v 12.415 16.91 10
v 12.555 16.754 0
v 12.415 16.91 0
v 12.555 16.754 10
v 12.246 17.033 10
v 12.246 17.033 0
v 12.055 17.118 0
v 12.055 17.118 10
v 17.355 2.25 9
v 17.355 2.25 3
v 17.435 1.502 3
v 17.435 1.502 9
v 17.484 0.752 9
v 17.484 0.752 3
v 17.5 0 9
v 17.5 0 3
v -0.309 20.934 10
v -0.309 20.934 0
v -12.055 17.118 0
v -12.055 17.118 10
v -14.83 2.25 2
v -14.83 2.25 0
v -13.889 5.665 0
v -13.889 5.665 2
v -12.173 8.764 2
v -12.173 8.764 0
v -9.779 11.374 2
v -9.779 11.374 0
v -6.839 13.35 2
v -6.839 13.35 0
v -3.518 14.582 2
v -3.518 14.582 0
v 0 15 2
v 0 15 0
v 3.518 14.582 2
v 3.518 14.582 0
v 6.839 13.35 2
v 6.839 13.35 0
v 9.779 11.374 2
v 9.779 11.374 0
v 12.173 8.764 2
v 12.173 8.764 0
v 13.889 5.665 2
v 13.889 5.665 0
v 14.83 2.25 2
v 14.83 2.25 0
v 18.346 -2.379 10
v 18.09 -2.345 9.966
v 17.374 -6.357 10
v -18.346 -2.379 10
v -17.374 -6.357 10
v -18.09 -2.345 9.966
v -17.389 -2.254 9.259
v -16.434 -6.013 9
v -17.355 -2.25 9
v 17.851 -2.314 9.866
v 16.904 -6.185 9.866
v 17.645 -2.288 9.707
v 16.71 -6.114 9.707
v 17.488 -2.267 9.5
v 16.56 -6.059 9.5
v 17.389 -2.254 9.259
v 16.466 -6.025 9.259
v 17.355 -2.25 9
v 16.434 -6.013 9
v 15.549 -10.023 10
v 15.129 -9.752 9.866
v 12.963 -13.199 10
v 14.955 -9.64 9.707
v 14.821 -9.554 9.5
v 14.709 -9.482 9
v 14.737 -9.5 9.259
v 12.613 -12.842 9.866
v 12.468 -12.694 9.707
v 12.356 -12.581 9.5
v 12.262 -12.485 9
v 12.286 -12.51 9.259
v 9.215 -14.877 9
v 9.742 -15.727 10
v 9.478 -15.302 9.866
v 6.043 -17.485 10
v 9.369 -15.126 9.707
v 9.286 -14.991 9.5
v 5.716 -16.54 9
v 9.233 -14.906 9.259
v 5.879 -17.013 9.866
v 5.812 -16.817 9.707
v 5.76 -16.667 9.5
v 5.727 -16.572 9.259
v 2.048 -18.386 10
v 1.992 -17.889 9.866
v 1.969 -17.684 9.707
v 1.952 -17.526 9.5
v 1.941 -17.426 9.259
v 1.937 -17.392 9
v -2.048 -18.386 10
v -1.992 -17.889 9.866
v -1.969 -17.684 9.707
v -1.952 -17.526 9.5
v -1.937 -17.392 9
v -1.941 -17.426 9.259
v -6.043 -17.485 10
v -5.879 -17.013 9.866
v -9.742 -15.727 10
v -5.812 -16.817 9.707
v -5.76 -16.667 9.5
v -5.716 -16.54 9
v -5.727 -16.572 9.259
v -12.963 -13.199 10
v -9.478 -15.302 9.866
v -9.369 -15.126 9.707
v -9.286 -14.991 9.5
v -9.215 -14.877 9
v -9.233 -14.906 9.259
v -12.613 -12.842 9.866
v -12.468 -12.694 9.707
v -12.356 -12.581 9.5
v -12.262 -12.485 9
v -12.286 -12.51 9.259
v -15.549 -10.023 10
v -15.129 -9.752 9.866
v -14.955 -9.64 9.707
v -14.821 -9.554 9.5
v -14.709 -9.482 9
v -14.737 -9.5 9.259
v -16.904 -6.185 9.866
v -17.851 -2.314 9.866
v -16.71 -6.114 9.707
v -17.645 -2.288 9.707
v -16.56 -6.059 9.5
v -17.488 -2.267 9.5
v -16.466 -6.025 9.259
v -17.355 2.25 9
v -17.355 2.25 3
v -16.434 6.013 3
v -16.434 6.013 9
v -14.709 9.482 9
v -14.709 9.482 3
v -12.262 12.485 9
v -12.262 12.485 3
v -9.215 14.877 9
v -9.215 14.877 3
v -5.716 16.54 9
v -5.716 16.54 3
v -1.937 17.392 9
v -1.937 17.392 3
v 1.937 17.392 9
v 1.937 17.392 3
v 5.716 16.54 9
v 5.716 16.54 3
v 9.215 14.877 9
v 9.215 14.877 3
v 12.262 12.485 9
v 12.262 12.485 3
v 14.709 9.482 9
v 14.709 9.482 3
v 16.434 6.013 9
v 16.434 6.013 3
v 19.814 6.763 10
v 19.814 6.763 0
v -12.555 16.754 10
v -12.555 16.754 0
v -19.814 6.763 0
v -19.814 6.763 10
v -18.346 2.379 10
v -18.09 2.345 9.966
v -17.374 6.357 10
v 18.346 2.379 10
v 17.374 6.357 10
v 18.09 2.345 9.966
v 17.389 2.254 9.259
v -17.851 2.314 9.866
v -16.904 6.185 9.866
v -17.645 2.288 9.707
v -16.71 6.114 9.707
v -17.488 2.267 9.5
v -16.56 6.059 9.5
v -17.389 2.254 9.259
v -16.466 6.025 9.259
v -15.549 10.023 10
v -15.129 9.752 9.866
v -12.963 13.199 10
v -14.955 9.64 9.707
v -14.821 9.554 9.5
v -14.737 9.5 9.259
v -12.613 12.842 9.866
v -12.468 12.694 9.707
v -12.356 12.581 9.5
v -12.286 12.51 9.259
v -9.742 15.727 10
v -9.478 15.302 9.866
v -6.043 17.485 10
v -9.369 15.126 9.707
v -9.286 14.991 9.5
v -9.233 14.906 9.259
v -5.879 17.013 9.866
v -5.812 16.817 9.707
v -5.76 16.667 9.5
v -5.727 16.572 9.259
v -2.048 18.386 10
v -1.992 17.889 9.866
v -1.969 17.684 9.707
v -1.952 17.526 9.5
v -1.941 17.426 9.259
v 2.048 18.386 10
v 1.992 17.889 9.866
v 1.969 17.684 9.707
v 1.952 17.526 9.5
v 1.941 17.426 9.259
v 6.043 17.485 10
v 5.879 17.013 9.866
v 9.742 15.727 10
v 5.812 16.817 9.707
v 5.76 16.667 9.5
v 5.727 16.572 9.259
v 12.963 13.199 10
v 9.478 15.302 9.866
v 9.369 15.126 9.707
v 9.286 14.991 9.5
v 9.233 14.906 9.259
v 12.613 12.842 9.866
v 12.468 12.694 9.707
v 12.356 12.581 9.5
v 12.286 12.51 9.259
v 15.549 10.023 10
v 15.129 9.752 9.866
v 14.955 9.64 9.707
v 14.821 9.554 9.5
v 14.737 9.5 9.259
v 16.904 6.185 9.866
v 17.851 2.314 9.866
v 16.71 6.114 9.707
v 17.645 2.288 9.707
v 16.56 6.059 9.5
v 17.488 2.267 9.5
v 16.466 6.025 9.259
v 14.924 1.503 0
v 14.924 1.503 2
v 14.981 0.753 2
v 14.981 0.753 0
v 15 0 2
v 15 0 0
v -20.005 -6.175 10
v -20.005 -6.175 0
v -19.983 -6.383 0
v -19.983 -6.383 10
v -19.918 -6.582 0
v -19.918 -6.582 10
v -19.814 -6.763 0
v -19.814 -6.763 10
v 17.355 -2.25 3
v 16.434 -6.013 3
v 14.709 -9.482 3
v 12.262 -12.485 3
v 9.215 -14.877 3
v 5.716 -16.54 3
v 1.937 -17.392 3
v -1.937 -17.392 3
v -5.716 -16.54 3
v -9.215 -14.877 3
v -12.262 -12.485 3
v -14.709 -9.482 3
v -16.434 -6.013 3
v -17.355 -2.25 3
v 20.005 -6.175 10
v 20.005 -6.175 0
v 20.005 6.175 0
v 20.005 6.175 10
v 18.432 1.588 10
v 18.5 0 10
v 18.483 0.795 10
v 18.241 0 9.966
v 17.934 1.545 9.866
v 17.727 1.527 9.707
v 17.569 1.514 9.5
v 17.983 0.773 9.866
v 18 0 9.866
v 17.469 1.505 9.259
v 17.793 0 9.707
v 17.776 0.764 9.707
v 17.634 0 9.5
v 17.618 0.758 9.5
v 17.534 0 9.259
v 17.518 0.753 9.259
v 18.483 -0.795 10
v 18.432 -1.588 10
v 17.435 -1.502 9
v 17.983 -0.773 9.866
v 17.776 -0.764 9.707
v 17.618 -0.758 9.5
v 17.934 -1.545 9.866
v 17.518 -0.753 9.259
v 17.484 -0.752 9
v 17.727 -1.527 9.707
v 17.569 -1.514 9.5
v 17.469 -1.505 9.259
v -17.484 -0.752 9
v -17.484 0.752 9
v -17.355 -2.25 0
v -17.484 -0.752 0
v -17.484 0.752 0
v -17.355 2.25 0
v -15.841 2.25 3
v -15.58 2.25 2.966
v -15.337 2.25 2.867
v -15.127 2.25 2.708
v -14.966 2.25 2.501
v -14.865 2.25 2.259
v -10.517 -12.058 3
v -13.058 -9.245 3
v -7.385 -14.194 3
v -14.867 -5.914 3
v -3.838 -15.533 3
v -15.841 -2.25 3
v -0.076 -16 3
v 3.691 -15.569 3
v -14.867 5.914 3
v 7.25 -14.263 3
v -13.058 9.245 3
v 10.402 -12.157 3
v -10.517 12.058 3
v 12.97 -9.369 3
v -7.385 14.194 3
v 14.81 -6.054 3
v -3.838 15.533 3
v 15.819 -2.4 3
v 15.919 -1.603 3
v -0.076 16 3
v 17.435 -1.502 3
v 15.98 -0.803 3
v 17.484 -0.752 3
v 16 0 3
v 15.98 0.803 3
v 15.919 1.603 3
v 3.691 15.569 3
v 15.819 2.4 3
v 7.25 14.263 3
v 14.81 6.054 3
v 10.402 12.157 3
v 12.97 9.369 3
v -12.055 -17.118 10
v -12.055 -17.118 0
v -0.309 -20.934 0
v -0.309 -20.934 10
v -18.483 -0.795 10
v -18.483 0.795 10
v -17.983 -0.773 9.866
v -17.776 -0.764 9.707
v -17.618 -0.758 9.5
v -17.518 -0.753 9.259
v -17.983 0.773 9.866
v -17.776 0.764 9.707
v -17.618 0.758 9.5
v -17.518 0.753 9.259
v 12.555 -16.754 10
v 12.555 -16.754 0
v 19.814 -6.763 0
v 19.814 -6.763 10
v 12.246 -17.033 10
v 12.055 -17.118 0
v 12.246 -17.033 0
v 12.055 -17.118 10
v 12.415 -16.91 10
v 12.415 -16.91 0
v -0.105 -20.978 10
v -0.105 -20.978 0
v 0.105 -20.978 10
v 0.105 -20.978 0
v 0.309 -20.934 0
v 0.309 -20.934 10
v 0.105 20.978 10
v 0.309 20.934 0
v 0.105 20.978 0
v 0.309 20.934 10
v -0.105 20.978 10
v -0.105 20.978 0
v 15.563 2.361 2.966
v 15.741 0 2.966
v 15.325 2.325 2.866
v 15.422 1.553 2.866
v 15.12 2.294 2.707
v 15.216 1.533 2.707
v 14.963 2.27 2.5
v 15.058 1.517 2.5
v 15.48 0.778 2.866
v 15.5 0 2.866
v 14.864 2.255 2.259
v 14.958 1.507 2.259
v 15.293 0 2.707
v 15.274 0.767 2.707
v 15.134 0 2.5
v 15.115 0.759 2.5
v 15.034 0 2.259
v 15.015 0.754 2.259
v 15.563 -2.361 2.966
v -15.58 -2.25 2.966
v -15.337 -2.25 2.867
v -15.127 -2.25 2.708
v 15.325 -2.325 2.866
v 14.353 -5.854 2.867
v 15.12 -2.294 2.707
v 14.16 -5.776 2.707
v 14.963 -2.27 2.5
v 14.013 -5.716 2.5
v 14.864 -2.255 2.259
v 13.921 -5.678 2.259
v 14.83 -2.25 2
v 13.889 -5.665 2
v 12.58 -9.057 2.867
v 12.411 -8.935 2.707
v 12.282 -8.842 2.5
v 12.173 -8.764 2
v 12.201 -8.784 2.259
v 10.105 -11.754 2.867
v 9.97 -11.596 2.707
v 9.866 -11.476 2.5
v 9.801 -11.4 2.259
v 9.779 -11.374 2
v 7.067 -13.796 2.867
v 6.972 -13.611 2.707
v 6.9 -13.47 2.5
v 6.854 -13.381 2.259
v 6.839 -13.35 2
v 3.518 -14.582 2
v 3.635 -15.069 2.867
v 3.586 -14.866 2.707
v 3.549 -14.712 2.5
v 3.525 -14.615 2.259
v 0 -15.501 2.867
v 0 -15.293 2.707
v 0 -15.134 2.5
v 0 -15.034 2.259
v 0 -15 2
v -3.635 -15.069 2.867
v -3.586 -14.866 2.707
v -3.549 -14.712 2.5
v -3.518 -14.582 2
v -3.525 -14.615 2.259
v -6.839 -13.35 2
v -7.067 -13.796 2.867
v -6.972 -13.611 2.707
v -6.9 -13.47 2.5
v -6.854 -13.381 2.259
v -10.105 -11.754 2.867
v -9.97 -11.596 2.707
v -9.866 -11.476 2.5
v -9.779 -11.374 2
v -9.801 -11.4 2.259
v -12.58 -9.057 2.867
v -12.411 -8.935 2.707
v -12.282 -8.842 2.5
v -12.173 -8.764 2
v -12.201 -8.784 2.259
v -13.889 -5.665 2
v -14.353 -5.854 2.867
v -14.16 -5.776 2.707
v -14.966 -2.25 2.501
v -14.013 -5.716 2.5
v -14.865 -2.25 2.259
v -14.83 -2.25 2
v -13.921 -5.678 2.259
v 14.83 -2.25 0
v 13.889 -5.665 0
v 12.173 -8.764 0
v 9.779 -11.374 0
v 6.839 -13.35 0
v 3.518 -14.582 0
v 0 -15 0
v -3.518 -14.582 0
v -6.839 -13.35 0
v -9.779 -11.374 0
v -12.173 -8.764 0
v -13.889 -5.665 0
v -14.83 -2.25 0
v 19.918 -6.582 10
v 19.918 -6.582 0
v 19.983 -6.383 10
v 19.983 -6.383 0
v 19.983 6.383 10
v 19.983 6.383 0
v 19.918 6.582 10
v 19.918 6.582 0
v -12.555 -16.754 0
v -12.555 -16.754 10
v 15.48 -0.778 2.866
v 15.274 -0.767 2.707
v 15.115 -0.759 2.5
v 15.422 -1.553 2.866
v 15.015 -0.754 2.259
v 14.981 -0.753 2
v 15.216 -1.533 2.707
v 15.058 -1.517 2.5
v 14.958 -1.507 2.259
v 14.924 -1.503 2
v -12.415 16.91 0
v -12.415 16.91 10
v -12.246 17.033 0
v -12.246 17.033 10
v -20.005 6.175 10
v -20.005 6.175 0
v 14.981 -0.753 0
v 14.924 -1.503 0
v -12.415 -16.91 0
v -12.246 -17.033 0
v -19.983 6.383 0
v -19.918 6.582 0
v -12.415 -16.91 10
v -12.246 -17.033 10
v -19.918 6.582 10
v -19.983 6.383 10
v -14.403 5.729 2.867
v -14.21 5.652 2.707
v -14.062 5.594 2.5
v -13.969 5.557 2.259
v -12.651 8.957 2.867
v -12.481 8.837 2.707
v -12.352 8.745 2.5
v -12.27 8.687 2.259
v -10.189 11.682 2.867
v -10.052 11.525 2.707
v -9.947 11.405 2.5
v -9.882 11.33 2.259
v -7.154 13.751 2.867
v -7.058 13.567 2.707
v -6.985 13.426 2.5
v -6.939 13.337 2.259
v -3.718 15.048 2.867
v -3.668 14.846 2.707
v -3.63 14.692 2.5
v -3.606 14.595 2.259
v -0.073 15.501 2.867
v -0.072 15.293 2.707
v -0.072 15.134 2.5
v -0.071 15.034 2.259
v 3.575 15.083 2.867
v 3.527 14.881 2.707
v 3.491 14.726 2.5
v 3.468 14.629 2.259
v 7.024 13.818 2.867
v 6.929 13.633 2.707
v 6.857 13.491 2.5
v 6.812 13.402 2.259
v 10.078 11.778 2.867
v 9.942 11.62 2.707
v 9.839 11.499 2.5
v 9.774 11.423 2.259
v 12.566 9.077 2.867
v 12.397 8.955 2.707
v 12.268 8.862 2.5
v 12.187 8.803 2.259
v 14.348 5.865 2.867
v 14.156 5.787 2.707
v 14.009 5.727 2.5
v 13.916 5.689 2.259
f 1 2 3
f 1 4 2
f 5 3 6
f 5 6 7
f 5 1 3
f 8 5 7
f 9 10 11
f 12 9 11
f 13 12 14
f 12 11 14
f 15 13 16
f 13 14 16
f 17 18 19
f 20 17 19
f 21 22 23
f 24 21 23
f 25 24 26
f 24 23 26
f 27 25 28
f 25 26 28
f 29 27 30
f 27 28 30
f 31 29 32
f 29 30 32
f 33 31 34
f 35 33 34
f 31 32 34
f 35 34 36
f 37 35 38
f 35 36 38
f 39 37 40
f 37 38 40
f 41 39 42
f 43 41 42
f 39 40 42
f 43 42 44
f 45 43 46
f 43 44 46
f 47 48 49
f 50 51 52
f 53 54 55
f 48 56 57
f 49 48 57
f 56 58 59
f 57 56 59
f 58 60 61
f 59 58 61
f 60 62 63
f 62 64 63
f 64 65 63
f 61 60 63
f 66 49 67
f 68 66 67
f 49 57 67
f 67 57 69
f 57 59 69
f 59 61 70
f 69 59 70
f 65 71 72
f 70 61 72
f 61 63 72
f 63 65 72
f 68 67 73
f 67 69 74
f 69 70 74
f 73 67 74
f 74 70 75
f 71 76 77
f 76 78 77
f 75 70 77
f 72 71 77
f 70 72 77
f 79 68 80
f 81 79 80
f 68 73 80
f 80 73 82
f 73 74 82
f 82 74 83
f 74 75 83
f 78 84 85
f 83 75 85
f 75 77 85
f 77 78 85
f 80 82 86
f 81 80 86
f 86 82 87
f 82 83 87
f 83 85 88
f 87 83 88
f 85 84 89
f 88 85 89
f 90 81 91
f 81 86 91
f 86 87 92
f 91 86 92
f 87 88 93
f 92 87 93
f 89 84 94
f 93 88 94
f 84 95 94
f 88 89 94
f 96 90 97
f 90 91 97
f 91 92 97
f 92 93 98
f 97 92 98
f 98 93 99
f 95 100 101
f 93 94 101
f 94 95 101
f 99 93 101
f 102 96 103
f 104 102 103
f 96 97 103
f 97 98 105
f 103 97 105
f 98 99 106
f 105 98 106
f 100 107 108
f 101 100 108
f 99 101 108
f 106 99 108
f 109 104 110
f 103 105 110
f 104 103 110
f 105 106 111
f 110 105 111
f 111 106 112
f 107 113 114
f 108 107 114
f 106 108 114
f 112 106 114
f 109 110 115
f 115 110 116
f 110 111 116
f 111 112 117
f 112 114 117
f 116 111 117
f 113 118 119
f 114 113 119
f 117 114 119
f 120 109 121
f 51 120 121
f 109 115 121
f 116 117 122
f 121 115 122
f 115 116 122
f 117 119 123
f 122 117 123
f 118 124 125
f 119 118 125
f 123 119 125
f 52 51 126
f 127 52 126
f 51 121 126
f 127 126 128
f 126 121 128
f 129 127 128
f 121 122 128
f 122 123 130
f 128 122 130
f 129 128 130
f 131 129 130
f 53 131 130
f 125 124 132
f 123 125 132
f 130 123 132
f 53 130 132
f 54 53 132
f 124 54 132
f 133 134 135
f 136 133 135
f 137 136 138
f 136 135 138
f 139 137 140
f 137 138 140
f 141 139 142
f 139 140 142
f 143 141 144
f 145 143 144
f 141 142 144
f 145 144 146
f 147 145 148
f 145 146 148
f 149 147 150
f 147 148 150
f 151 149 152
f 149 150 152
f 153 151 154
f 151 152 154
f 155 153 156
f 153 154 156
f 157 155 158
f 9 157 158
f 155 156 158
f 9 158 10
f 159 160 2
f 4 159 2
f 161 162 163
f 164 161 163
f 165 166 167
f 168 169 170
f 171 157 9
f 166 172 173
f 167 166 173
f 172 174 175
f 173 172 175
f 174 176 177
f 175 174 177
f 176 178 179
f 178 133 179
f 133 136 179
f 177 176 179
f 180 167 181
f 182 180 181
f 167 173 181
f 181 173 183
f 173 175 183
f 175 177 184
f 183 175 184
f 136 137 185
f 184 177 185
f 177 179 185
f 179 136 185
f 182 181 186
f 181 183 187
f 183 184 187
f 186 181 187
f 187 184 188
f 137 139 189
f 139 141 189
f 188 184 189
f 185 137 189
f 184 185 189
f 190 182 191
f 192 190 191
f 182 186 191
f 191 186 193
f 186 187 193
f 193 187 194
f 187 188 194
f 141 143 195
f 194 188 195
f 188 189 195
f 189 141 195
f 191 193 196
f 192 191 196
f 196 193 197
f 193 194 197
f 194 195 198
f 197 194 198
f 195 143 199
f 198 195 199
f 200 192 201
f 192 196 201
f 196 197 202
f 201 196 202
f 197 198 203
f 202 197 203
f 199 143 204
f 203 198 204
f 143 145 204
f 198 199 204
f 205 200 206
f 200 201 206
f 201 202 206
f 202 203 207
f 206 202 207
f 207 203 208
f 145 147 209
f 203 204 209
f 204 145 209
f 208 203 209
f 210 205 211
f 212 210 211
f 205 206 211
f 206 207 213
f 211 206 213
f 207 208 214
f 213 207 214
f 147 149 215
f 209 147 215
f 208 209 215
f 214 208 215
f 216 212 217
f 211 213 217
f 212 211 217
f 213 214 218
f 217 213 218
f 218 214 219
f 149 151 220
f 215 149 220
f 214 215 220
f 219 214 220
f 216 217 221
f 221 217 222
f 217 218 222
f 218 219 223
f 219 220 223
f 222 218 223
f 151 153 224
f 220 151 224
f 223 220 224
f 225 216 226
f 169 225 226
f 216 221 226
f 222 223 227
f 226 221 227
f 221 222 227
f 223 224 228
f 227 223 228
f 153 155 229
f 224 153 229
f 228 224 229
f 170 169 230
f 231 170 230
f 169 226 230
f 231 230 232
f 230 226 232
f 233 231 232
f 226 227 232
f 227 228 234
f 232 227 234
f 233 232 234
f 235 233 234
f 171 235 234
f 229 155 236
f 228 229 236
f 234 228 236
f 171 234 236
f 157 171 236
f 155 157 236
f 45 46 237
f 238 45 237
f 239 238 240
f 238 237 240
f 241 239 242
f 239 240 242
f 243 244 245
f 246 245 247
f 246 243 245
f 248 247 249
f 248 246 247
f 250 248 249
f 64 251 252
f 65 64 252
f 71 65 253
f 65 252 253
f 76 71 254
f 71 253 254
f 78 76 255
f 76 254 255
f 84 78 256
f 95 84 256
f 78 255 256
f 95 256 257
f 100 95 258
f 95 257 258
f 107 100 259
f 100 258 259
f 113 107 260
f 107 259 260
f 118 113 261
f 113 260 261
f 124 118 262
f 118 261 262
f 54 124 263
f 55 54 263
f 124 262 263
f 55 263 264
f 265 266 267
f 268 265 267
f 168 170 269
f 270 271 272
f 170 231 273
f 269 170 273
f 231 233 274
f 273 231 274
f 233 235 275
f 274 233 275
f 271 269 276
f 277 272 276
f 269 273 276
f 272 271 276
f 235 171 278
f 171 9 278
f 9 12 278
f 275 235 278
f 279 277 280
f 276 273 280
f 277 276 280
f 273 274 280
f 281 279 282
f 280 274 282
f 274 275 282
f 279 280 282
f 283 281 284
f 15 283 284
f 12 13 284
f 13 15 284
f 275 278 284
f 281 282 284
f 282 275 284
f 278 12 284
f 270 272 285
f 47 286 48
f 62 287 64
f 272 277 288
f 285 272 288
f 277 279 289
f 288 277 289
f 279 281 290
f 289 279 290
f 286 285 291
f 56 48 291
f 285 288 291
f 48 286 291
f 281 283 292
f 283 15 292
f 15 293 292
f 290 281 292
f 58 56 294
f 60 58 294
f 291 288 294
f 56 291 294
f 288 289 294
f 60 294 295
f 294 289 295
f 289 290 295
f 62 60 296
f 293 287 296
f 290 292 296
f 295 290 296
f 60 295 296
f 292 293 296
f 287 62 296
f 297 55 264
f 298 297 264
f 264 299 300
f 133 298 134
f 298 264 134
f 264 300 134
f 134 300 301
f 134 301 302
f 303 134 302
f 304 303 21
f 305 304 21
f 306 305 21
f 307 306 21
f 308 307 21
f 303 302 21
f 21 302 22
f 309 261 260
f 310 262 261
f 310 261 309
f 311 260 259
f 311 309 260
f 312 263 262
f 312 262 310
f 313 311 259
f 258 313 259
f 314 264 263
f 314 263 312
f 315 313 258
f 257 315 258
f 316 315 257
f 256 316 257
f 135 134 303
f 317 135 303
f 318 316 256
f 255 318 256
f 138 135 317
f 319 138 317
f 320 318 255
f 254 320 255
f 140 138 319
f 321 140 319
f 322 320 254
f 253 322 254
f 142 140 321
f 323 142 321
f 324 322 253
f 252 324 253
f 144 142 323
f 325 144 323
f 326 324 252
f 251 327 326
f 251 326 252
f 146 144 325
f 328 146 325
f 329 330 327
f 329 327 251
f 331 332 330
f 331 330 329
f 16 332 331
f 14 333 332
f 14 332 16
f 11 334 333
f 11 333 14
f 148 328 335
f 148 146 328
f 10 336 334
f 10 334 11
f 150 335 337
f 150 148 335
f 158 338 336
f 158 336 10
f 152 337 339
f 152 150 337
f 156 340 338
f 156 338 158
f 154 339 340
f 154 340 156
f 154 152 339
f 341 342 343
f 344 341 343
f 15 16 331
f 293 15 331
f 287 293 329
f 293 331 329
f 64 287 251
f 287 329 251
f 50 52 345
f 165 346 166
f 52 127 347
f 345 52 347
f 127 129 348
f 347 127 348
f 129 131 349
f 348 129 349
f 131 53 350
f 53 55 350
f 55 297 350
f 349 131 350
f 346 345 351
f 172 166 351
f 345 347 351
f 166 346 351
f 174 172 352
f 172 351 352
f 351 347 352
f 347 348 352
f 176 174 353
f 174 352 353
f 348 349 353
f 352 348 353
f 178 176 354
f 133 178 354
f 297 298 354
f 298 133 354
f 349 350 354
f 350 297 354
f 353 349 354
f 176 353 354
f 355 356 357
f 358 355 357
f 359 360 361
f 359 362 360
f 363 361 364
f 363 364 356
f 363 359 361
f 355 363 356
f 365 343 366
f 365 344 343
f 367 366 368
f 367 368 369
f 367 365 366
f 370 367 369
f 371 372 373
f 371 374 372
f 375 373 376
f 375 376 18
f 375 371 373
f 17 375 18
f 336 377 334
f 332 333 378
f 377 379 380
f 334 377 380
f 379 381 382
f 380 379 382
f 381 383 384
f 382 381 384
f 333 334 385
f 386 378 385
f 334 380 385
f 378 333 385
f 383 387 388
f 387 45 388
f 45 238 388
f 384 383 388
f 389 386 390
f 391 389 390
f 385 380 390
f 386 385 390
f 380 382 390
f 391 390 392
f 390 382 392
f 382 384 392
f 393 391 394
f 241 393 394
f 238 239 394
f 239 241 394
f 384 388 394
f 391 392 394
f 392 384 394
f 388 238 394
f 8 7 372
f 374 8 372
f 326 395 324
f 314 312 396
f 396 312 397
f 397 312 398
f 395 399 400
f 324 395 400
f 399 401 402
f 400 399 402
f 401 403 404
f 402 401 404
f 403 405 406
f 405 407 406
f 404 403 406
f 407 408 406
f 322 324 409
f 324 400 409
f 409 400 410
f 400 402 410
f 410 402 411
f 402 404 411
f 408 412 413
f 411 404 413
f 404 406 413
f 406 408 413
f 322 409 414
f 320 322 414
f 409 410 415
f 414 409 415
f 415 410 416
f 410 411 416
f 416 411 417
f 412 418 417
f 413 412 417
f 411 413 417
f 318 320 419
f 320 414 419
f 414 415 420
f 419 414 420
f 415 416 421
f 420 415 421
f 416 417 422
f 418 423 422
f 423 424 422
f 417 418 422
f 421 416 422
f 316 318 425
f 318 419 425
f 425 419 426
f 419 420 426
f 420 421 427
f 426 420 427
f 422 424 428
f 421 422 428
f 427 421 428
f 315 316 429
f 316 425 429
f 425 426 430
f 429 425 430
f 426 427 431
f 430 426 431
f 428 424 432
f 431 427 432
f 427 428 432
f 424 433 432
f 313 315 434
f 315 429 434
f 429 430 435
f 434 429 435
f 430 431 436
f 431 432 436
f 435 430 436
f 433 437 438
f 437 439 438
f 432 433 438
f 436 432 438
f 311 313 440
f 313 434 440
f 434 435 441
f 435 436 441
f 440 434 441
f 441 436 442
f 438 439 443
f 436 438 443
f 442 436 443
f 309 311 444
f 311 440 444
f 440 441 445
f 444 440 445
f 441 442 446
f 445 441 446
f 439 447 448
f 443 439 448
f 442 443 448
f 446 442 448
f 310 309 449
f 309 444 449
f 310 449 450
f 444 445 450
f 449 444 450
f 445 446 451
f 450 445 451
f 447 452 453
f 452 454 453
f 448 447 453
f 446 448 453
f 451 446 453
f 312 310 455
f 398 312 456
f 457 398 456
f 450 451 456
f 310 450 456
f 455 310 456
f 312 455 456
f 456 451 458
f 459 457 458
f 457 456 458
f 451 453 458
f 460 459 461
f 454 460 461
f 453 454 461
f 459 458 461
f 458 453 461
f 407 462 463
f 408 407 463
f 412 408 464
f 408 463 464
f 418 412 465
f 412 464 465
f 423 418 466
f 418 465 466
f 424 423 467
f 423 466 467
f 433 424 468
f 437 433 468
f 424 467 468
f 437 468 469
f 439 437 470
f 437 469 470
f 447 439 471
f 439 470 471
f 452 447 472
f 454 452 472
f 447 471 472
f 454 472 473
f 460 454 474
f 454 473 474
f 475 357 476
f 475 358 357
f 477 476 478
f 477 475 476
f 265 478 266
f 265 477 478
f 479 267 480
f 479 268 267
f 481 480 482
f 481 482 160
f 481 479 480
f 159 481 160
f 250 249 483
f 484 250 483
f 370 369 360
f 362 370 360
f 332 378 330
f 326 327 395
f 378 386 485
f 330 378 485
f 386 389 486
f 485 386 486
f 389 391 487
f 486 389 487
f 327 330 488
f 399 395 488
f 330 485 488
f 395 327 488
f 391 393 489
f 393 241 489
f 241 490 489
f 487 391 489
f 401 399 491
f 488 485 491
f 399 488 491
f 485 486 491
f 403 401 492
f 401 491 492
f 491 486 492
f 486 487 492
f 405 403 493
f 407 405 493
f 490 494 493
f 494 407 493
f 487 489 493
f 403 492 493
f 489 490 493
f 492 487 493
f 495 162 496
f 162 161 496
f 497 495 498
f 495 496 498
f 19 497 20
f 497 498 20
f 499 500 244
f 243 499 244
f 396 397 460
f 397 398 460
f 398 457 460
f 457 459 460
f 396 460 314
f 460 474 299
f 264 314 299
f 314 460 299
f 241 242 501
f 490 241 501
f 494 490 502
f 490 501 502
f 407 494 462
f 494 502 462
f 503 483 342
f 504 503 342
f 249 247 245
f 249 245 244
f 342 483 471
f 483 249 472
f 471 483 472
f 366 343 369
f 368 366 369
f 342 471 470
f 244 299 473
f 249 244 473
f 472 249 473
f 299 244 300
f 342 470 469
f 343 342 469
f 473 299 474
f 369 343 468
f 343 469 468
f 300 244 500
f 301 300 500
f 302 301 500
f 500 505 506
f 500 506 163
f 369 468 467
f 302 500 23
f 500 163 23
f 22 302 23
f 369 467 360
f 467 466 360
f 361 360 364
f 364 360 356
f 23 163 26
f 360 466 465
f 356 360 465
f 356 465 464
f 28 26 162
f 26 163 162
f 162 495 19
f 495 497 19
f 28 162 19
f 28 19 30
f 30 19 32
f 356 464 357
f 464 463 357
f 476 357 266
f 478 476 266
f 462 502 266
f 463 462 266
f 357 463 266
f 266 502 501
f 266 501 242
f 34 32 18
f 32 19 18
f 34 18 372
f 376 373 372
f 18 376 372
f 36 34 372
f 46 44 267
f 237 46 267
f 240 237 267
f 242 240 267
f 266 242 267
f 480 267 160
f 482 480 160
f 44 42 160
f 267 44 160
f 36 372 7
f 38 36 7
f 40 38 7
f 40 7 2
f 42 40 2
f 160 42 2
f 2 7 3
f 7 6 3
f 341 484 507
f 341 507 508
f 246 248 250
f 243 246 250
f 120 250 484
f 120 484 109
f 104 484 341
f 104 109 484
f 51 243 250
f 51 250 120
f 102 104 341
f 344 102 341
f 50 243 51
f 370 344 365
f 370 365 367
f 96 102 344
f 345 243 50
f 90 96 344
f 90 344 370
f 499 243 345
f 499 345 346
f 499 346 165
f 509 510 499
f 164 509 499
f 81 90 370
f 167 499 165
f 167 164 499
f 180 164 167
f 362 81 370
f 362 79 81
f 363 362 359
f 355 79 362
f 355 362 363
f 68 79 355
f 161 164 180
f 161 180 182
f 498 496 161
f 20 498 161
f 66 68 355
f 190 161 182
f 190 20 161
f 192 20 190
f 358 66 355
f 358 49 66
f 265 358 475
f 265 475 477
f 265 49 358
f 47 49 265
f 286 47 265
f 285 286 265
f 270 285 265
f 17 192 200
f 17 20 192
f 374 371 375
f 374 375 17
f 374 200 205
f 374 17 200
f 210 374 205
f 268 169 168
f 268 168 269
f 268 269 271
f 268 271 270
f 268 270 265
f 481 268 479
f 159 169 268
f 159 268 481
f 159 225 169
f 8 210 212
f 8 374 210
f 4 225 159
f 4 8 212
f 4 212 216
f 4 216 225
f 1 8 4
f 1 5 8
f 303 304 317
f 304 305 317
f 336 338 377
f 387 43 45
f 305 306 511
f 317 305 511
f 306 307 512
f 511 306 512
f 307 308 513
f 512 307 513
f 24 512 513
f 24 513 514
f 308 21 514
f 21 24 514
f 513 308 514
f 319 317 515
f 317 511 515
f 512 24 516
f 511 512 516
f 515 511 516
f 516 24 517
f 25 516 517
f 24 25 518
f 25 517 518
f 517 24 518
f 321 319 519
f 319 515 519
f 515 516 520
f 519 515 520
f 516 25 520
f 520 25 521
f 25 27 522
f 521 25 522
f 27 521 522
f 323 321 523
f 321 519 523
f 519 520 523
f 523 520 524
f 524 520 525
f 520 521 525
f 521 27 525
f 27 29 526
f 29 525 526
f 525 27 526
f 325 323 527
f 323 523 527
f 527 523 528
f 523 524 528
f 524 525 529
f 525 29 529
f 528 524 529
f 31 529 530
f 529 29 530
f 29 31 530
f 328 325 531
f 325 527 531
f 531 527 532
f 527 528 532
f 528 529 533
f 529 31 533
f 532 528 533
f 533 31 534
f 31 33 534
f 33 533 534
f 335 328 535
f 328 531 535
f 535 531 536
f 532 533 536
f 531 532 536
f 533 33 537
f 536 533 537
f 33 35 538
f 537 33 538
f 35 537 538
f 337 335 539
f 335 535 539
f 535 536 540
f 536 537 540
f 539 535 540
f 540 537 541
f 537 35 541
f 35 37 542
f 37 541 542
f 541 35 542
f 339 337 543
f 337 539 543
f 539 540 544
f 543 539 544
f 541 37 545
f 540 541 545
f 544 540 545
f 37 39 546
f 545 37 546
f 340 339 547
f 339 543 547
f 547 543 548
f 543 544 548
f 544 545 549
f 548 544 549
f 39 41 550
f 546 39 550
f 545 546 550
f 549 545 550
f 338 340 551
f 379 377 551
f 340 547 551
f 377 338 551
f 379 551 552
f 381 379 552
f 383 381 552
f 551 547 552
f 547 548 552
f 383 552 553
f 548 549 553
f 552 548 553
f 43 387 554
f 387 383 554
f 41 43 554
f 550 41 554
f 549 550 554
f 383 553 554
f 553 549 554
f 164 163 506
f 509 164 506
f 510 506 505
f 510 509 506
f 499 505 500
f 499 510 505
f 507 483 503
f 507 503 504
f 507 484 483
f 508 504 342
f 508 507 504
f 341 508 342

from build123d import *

# Parameters (mm, degrees)
F1_DEPTH = 10
F2_DEPTH = 3
F3_R     = 1
F4_R     = 1
F5_R     = 1


with BuildPart() as f1:
    # F0 (on Top) → F1 (new body)
    with BuildSketch(Plane.XY):
        with BuildLine():
            ThreePointArc((17.3547543918, 2.25), (17.4636508476, 1.1273415949), (17.5, 0))
            ThreePointArc((17.5, 0), (17.4636508476, -1.1273415949), (17.3547543918, -2.25))
            Line((17.3547543918, -2.25), (20.0049429916, -2.25))
            Line((20.0049429916, -2.25), (20.0049429916, 2.25))
            Line((20.0049429916, 2.25), (17.3547543918, 2.25))
        make_face()
        with BuildLine():
            ThreePointArc((-17.3547543918, 2.25), (0, 17.5), (17.3547543918, 2.25))
            Line((17.3547543918, 2.25), (20.0049429916, 2.25))
            Line((20.0049429916, 2.25), (20.0049429916, 6.5))
            Line((20.0049429916, 6.5), (12.3637347118, 17.0172209269))
            Line((12.3637347118, 17.0172209269), (0, 21.0344418537))
            Line((0, 21.0344418537), (-12.3637347118, 17.0172209269))
            Line((-12.3637347118, 17.0172209269), (-20.0049429916, 6.5))
            Line((-20.0049429916, 6.5), (-20.0049429916, 2.25))
            Line((-20.0049429916, 2.25), (-17.3547543918, 2.25))
        make_face()
        with BuildLine():
            Line((20.0049429916, -2.25), (17.3547543918, -2.25))
            ThreePointArc((17.3547543918, -2.25), (0, -17.5), (-17.3547543918, -2.25))
            Line((-17.3547543918, -2.25), (-20.0049429916, -2.25))
            Line((-20.0049429916, -2.25), (-20.0049429916, -6.5))
            Line((-20.0049429916, -6.5), (-12.3637347118, -17.0172209269))
            Line((-12.3637347118, -17.0172209269), (0, -21.0344418537))
            Line((0, -21.0344418537), (12.3637347118, -17.0172209269))
            Line((12.3637347118, -17.0172209269), (20.0049429916, -6.5))
            Line((20.0049429916, -6.5), (20.0049429916, -2.25))
        make_face()
        with BuildLine():
            ThreePointArc((-17.3547543918, -2.25), (-17.5, 0), (-17.3547543918, 2.25))
            Line((-17.3547543918, 2.25), (-20.0049429916, 2.25))
            Line((-20.0049429916, 2.25), (-20.0049429916, -2.25))
            Line((-20.0049429916, -2.25), (-17.3547543918, -2.25))
        make_face()
    extrude(amount=F1_DEPTH)

    # F0 (on Top) → F2 (join)
    with BuildSketch(Plane.XY):
        with BuildLine():
            ThreePointArc((17.3547543918, -2.25), (17.4636508476, -1.1273415949), (17.5, 0))
            ThreePointArc((17.5, 0), (17.4636508476, 1.1273415949), (17.3547543918, 2.25))
            Line((17.3547543918, 2.25), (14.83028995, 2.25))
            ThreePointArc((14.83028995, 2.25), (14.957512314, 1.1281956281), (15, 0))
            ThreePointArc((15, 0), (14.957512314, -1.1281956281), (14.83028995, -2.25))
            Line((14.83028995, -2.25), (17.3547543918, -2.25))
        make_face()
        with BuildLine():
            ThreePointArc((-17.3547543918, -2.25), (0, -17.5), (17.3547543918, -2.25))
            Line((17.3547543918, -2.25), (14.83028995, -2.25))
            ThreePointArc((14.83028995, -2.25), (0, -15), (-14.83028995, -2.25))
            Line((-14.83028995, -2.25), (-17.3547543918, -2.25))
        make_face()
        with BuildLine():
            Line((14.83028995, 2.25), (17.3547543918, 2.25))
            ThreePointArc((17.3547543918, 2.25), (0, 17.5), (-17.3547543918, 2.25))
            Line((-17.3547543918, 2.25), (-14.83028995, 2.25))
            ThreePointArc((-14.83028995, 2.25), (0, 15), (14.83028995, 2.25))
        make_face()
    extrude(amount=F2_DEPTH)

    # F3
    f3_edges = [f1.edges().sort_by_distance(p)[0] for p in [
        (15, 0, 3),
    ]]
    fillet(f3_edges, radius=F3_R)

    # F4
    f4_edges = [f1.edges().sort_by_distance(p)[0] for p in [
        (20.004943, -6.5, 5),
        (12.363735, -17.017221, 5),
        (0, -21.034442, 5),
        (-12.363735, -17.017221, 5),
        (-20.004943, -6.5, 5),
        (-20.004943, 6.5, 5),
        (0, 21.034442, 5),
        (-12.363735, 17.017221, 5),
        (12.363735, 17.017221, 5),
        (20.004943, 6.5, 5),
    ]]
    fillet(f4_edges, radius=F4_R)

    # F5
    f5_edges = [f1.edges().sort_by_distance(p)[0] for p in [
        (17.354754, 2.25, 10),
    ]]
    fillet(f5_edges, radius=F5_R)


solid = f1.part
